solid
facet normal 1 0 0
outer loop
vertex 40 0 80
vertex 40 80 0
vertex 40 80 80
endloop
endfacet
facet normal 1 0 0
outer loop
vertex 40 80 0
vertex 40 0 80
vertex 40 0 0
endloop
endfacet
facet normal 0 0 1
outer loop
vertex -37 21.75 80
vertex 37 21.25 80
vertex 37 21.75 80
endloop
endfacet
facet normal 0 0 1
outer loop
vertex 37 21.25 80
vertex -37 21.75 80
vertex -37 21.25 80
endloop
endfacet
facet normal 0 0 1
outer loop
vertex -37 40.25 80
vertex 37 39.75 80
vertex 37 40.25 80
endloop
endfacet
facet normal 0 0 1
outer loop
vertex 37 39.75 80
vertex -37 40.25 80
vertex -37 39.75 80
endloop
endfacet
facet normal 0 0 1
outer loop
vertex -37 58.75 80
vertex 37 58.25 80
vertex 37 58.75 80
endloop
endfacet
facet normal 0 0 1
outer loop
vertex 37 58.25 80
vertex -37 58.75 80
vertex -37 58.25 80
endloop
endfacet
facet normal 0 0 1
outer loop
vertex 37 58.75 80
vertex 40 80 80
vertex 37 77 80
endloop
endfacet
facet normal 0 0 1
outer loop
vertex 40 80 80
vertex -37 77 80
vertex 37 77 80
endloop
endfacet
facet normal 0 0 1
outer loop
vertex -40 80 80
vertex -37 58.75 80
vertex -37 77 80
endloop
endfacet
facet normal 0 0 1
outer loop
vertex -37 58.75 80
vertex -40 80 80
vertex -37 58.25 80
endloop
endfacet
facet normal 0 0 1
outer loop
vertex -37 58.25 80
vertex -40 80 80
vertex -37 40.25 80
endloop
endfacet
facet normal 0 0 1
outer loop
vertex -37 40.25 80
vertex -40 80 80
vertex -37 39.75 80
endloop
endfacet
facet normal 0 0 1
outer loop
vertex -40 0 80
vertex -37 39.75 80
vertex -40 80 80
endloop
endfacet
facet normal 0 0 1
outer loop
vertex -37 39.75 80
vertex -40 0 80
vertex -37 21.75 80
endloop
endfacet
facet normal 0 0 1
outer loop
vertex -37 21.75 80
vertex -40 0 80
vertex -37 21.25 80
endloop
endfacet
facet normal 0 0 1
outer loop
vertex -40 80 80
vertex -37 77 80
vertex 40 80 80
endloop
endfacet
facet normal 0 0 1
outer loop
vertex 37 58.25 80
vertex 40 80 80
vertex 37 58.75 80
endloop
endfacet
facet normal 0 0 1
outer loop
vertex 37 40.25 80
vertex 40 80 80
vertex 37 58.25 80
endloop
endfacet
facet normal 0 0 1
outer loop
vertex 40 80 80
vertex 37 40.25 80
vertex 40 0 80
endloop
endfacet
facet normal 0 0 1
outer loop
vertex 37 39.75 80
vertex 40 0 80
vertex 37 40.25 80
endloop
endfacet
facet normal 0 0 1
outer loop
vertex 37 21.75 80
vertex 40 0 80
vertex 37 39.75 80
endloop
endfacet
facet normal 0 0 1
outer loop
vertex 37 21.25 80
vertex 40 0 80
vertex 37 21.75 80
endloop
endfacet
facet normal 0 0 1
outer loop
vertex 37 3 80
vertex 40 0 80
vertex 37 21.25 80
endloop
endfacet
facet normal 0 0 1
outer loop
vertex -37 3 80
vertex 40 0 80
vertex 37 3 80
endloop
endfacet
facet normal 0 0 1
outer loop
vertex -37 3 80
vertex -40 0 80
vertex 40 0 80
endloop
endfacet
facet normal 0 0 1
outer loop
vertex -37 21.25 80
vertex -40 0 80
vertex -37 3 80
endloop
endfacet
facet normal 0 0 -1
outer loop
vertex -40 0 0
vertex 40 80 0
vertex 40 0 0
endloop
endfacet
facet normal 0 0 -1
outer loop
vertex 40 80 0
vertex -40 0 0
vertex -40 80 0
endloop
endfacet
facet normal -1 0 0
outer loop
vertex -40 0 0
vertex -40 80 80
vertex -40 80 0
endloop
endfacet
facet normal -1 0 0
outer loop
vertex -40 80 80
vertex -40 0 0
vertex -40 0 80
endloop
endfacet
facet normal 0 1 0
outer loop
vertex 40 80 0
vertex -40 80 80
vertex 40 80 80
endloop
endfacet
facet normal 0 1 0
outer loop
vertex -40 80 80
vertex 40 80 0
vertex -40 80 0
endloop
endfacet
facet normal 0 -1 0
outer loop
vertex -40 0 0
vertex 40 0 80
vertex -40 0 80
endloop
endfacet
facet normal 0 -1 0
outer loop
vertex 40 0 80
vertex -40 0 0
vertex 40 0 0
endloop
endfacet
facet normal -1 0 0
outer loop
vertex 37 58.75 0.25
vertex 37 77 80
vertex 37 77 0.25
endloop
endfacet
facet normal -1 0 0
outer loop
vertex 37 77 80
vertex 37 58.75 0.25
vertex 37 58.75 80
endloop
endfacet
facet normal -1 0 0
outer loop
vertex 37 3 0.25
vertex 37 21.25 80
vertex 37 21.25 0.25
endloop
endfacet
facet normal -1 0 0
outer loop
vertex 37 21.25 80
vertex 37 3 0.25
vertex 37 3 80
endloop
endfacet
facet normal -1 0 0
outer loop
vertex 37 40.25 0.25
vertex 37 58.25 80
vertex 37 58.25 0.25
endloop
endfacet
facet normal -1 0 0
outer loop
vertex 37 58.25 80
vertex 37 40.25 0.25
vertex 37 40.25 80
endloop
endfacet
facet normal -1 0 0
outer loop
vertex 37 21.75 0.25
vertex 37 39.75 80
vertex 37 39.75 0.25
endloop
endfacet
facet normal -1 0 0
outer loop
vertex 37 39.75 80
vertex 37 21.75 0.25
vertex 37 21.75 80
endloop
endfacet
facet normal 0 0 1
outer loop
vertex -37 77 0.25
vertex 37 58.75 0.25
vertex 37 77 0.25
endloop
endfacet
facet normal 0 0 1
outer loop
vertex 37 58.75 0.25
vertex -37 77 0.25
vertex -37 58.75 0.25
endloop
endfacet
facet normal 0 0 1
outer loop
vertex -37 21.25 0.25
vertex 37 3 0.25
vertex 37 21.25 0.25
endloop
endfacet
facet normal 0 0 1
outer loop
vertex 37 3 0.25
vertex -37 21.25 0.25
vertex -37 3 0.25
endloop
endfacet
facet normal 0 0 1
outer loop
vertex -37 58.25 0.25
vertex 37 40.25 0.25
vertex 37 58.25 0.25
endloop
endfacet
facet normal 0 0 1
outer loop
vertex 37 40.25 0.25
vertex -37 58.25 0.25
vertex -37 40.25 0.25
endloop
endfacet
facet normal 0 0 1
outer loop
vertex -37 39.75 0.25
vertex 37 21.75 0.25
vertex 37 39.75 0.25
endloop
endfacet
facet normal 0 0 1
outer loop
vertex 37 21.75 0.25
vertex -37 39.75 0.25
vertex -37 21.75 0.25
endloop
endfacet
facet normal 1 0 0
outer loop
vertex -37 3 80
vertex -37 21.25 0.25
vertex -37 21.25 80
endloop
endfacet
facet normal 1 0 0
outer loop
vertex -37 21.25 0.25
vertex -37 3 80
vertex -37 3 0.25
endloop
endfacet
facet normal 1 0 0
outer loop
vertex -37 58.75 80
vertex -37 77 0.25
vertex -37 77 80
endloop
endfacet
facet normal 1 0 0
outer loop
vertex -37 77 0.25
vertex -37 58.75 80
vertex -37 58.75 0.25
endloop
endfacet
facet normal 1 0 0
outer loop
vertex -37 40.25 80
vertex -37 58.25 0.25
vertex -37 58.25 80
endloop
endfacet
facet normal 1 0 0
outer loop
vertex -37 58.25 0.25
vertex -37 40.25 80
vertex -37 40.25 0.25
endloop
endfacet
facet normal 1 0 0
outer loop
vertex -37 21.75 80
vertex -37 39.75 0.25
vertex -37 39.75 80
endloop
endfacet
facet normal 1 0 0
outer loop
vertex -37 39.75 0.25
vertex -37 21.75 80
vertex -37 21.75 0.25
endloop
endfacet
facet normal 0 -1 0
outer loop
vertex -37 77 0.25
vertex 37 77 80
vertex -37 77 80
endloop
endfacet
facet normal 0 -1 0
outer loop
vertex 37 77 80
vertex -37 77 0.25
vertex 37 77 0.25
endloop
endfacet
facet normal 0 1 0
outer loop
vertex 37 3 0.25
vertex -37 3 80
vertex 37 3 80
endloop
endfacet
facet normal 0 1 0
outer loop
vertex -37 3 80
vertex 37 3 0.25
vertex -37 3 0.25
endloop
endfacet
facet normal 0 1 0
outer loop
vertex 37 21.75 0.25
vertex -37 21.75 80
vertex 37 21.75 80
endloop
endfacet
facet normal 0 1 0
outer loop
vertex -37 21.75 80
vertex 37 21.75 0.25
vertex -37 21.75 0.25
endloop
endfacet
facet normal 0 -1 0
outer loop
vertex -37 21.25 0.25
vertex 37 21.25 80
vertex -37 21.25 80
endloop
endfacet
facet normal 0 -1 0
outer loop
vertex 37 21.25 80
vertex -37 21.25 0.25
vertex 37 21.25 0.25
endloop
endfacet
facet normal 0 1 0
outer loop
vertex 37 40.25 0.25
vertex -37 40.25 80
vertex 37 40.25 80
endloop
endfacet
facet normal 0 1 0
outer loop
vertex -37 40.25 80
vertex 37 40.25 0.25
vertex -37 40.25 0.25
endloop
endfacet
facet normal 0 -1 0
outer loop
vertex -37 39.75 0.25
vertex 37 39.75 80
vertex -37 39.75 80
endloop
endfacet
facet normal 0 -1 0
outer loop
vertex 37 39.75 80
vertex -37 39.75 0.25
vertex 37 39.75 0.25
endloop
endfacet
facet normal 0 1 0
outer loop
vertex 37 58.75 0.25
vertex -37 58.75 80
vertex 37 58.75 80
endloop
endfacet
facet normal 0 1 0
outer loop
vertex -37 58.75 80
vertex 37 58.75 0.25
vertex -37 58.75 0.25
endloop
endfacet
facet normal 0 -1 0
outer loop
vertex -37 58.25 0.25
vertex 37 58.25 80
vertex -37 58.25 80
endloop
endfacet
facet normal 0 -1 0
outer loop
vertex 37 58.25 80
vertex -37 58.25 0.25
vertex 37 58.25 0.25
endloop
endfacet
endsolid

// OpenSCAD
// file: ../inc/rounded_box.scad
//use <MCAD/shapes.scad>;


module myRoundedBox(l, lg, h, r) {
    linear_extrude(height = h)
            polygon(points=[[l/2-r,lg/2],[l/2,lg/2-r]
                ,[l/2,-lg/2+r],[l/2-r,-lg/2]
                ,[-l/2+r,-lg/2],[-l/2,-lg/2+r]
                ,[-l/2,lg/2-r],[-l/2+r,lg/2]]);
}

module myRoundedBox2(l, lg, h, r) {
    translate([-l/2,-lg/2,0]) cube([l, lg, h]);
}

module myRoundedBox3(l, lg, h, r) {
    //translate([0,0,h/2])roundedBox(l, lg, h, r);
}

module myRenfort(l, lg, e){
    translate([0,e/2,0]) rotate(a=[90,-90,0])
    linear_extrude(height = e)
            polygon(points=[[0,0],[l,0],[0,lg]]);
}

//myRoundedBox2(100,200, 10, 5);
// main file
use <../config.scad>
use <../inc/rounded_box.scad>

l1 = 80;
l1_int = 74;



l = 164;
e = 2;

module big_casier(){
    difference(){
        myRoundedBox(l,l,l,3);
        translate([0,0,e])myRoundedBox(l-2*e,l-2*e,l,3);
    }
}

module little_casier(){
    difference(){
        myRoundedBox(l,l,l/2,3);
        translate([0,0,e])myRoundedBox(l-2*e,l-2*e,l,3);
    }
    
    for(i = [-4:4]){
        %translate([-l/2,i*20-e2/2,1])cube([l, e2, l/2]);
    }
}

//little_casier();

module schema(){
    
}

ebox = 3;
module box_1x1(){
    difference(){
        translate([-l1/2,0,0]) cube([l1,l1,l1]);
        translate([-l1/2+ebox,ebox,0.25]) cube([l1_int,l1_int,l1]);
    }
    //translate([-l1/2, l1/2-l1_int/2-0.25,0]) cube([l1,0.5,l1]);
    translate([-l1/2, l1/2-l1_int/4-0.25,0]) cube([l1,0.5,l1]);
    translate([-l1/2, l1/2-0.25,0]) cube([l1,0.5,l1]);
    translate([-l1/2, l1/2+l1_int/4-0.25,0]) cube([l1,0.5,l1]);
    //translate([-l1/2, l1/2+l1_int/2-0.25,0]) cube([l1,0.5,l1]);
    
}

module etiquette(l_etiquette = 15){
    e_etiquette = 0.25;
    h_etiquette = 10;
    hull(){
        translate([-l_etiquette/2,0,0]) cube([l_etiquette, e_etiquette,e_etiquette]);
        translate([-l_etiquette/2,-1.25,2]) cube([l_etiquette, 2,e_etiquette]);
        
        
    }
    translate([-l_etiquette/2,-1.25,2]) cube([l_etiquette, e_etiquette,3]);
    for(i=[0,1]){
        mirror([i,0,0]) translate([-l_etiquette/2,-1.25,2]) cube([3, e_etiquette,h_etiquette]);
        mirror([i,0,0]) translate([-l_etiquette/2,-1.25,2]) cube([e_etiquette, 3,h_etiquette]);
    }
}

module little_tirroir_1x1(){
    l1_tir = 70;
    h_tir = l1_tir/4;
    e_tir = 0.75;
    difference(){
        union(){
            translate([-l1_tir/2,0,0]) cube([l1_tir,l1_tir,15]);
            translate([-l1_tir/2-e,0,0]) cube([l1_tir+2*e,e,h_tir]);
        }
        translate([-l1_tir/2+e_tir,e,e_tir]) cube([l1_tir-2*e_tir,l1_tir-e_tir-e,h_tir]);
    }
    
    hull(){
        translate([-10,0,0]) cube([20, e,e]);
        translate([0,-5,0])cylinder(r=5, e);
    }
    
    l_eti=18;
    translate([l_eti/2,0,3]) etiquette(l_eti);
    translate([-l_eti/2,0,3]) etiquette(l_eti);
    translate([l_eti/2+l_eti,0,3]) etiquette(l_eti);
    translate([-l_eti/2-l_eti,0,3]) etiquette(l_eti);
    
    if(true){
        translate([l1_tir*(-0.5+0.25),0,0]) cube([e_tir,l1_tir,13]);
        translate([l1_tir*(-0.5+0.50),0,0]) cube([e_tir,l1_tir,13]);
        translate([l1_tir*(-0.5+0.75),0,0]) cube([e_tir,l1_tir,13]);
    }
    
    
}

mode=1;
if(mode==0){
    h = 4;
    translate([0,l1+10,00])rotate([90,0,0])box_1x1();
    translate([0,0,h])little_tirroir_1x1();
    translate([0,0,h+1*l1_int/4]) little_tirroir_1x1();
    translate([0,0,h+2*l1_int/4])little_tirroir_1x1();
    translate([0,0,h+3*l1_int/4])little_tirroir_1x1();
} else {
    box_1x1();
} 
